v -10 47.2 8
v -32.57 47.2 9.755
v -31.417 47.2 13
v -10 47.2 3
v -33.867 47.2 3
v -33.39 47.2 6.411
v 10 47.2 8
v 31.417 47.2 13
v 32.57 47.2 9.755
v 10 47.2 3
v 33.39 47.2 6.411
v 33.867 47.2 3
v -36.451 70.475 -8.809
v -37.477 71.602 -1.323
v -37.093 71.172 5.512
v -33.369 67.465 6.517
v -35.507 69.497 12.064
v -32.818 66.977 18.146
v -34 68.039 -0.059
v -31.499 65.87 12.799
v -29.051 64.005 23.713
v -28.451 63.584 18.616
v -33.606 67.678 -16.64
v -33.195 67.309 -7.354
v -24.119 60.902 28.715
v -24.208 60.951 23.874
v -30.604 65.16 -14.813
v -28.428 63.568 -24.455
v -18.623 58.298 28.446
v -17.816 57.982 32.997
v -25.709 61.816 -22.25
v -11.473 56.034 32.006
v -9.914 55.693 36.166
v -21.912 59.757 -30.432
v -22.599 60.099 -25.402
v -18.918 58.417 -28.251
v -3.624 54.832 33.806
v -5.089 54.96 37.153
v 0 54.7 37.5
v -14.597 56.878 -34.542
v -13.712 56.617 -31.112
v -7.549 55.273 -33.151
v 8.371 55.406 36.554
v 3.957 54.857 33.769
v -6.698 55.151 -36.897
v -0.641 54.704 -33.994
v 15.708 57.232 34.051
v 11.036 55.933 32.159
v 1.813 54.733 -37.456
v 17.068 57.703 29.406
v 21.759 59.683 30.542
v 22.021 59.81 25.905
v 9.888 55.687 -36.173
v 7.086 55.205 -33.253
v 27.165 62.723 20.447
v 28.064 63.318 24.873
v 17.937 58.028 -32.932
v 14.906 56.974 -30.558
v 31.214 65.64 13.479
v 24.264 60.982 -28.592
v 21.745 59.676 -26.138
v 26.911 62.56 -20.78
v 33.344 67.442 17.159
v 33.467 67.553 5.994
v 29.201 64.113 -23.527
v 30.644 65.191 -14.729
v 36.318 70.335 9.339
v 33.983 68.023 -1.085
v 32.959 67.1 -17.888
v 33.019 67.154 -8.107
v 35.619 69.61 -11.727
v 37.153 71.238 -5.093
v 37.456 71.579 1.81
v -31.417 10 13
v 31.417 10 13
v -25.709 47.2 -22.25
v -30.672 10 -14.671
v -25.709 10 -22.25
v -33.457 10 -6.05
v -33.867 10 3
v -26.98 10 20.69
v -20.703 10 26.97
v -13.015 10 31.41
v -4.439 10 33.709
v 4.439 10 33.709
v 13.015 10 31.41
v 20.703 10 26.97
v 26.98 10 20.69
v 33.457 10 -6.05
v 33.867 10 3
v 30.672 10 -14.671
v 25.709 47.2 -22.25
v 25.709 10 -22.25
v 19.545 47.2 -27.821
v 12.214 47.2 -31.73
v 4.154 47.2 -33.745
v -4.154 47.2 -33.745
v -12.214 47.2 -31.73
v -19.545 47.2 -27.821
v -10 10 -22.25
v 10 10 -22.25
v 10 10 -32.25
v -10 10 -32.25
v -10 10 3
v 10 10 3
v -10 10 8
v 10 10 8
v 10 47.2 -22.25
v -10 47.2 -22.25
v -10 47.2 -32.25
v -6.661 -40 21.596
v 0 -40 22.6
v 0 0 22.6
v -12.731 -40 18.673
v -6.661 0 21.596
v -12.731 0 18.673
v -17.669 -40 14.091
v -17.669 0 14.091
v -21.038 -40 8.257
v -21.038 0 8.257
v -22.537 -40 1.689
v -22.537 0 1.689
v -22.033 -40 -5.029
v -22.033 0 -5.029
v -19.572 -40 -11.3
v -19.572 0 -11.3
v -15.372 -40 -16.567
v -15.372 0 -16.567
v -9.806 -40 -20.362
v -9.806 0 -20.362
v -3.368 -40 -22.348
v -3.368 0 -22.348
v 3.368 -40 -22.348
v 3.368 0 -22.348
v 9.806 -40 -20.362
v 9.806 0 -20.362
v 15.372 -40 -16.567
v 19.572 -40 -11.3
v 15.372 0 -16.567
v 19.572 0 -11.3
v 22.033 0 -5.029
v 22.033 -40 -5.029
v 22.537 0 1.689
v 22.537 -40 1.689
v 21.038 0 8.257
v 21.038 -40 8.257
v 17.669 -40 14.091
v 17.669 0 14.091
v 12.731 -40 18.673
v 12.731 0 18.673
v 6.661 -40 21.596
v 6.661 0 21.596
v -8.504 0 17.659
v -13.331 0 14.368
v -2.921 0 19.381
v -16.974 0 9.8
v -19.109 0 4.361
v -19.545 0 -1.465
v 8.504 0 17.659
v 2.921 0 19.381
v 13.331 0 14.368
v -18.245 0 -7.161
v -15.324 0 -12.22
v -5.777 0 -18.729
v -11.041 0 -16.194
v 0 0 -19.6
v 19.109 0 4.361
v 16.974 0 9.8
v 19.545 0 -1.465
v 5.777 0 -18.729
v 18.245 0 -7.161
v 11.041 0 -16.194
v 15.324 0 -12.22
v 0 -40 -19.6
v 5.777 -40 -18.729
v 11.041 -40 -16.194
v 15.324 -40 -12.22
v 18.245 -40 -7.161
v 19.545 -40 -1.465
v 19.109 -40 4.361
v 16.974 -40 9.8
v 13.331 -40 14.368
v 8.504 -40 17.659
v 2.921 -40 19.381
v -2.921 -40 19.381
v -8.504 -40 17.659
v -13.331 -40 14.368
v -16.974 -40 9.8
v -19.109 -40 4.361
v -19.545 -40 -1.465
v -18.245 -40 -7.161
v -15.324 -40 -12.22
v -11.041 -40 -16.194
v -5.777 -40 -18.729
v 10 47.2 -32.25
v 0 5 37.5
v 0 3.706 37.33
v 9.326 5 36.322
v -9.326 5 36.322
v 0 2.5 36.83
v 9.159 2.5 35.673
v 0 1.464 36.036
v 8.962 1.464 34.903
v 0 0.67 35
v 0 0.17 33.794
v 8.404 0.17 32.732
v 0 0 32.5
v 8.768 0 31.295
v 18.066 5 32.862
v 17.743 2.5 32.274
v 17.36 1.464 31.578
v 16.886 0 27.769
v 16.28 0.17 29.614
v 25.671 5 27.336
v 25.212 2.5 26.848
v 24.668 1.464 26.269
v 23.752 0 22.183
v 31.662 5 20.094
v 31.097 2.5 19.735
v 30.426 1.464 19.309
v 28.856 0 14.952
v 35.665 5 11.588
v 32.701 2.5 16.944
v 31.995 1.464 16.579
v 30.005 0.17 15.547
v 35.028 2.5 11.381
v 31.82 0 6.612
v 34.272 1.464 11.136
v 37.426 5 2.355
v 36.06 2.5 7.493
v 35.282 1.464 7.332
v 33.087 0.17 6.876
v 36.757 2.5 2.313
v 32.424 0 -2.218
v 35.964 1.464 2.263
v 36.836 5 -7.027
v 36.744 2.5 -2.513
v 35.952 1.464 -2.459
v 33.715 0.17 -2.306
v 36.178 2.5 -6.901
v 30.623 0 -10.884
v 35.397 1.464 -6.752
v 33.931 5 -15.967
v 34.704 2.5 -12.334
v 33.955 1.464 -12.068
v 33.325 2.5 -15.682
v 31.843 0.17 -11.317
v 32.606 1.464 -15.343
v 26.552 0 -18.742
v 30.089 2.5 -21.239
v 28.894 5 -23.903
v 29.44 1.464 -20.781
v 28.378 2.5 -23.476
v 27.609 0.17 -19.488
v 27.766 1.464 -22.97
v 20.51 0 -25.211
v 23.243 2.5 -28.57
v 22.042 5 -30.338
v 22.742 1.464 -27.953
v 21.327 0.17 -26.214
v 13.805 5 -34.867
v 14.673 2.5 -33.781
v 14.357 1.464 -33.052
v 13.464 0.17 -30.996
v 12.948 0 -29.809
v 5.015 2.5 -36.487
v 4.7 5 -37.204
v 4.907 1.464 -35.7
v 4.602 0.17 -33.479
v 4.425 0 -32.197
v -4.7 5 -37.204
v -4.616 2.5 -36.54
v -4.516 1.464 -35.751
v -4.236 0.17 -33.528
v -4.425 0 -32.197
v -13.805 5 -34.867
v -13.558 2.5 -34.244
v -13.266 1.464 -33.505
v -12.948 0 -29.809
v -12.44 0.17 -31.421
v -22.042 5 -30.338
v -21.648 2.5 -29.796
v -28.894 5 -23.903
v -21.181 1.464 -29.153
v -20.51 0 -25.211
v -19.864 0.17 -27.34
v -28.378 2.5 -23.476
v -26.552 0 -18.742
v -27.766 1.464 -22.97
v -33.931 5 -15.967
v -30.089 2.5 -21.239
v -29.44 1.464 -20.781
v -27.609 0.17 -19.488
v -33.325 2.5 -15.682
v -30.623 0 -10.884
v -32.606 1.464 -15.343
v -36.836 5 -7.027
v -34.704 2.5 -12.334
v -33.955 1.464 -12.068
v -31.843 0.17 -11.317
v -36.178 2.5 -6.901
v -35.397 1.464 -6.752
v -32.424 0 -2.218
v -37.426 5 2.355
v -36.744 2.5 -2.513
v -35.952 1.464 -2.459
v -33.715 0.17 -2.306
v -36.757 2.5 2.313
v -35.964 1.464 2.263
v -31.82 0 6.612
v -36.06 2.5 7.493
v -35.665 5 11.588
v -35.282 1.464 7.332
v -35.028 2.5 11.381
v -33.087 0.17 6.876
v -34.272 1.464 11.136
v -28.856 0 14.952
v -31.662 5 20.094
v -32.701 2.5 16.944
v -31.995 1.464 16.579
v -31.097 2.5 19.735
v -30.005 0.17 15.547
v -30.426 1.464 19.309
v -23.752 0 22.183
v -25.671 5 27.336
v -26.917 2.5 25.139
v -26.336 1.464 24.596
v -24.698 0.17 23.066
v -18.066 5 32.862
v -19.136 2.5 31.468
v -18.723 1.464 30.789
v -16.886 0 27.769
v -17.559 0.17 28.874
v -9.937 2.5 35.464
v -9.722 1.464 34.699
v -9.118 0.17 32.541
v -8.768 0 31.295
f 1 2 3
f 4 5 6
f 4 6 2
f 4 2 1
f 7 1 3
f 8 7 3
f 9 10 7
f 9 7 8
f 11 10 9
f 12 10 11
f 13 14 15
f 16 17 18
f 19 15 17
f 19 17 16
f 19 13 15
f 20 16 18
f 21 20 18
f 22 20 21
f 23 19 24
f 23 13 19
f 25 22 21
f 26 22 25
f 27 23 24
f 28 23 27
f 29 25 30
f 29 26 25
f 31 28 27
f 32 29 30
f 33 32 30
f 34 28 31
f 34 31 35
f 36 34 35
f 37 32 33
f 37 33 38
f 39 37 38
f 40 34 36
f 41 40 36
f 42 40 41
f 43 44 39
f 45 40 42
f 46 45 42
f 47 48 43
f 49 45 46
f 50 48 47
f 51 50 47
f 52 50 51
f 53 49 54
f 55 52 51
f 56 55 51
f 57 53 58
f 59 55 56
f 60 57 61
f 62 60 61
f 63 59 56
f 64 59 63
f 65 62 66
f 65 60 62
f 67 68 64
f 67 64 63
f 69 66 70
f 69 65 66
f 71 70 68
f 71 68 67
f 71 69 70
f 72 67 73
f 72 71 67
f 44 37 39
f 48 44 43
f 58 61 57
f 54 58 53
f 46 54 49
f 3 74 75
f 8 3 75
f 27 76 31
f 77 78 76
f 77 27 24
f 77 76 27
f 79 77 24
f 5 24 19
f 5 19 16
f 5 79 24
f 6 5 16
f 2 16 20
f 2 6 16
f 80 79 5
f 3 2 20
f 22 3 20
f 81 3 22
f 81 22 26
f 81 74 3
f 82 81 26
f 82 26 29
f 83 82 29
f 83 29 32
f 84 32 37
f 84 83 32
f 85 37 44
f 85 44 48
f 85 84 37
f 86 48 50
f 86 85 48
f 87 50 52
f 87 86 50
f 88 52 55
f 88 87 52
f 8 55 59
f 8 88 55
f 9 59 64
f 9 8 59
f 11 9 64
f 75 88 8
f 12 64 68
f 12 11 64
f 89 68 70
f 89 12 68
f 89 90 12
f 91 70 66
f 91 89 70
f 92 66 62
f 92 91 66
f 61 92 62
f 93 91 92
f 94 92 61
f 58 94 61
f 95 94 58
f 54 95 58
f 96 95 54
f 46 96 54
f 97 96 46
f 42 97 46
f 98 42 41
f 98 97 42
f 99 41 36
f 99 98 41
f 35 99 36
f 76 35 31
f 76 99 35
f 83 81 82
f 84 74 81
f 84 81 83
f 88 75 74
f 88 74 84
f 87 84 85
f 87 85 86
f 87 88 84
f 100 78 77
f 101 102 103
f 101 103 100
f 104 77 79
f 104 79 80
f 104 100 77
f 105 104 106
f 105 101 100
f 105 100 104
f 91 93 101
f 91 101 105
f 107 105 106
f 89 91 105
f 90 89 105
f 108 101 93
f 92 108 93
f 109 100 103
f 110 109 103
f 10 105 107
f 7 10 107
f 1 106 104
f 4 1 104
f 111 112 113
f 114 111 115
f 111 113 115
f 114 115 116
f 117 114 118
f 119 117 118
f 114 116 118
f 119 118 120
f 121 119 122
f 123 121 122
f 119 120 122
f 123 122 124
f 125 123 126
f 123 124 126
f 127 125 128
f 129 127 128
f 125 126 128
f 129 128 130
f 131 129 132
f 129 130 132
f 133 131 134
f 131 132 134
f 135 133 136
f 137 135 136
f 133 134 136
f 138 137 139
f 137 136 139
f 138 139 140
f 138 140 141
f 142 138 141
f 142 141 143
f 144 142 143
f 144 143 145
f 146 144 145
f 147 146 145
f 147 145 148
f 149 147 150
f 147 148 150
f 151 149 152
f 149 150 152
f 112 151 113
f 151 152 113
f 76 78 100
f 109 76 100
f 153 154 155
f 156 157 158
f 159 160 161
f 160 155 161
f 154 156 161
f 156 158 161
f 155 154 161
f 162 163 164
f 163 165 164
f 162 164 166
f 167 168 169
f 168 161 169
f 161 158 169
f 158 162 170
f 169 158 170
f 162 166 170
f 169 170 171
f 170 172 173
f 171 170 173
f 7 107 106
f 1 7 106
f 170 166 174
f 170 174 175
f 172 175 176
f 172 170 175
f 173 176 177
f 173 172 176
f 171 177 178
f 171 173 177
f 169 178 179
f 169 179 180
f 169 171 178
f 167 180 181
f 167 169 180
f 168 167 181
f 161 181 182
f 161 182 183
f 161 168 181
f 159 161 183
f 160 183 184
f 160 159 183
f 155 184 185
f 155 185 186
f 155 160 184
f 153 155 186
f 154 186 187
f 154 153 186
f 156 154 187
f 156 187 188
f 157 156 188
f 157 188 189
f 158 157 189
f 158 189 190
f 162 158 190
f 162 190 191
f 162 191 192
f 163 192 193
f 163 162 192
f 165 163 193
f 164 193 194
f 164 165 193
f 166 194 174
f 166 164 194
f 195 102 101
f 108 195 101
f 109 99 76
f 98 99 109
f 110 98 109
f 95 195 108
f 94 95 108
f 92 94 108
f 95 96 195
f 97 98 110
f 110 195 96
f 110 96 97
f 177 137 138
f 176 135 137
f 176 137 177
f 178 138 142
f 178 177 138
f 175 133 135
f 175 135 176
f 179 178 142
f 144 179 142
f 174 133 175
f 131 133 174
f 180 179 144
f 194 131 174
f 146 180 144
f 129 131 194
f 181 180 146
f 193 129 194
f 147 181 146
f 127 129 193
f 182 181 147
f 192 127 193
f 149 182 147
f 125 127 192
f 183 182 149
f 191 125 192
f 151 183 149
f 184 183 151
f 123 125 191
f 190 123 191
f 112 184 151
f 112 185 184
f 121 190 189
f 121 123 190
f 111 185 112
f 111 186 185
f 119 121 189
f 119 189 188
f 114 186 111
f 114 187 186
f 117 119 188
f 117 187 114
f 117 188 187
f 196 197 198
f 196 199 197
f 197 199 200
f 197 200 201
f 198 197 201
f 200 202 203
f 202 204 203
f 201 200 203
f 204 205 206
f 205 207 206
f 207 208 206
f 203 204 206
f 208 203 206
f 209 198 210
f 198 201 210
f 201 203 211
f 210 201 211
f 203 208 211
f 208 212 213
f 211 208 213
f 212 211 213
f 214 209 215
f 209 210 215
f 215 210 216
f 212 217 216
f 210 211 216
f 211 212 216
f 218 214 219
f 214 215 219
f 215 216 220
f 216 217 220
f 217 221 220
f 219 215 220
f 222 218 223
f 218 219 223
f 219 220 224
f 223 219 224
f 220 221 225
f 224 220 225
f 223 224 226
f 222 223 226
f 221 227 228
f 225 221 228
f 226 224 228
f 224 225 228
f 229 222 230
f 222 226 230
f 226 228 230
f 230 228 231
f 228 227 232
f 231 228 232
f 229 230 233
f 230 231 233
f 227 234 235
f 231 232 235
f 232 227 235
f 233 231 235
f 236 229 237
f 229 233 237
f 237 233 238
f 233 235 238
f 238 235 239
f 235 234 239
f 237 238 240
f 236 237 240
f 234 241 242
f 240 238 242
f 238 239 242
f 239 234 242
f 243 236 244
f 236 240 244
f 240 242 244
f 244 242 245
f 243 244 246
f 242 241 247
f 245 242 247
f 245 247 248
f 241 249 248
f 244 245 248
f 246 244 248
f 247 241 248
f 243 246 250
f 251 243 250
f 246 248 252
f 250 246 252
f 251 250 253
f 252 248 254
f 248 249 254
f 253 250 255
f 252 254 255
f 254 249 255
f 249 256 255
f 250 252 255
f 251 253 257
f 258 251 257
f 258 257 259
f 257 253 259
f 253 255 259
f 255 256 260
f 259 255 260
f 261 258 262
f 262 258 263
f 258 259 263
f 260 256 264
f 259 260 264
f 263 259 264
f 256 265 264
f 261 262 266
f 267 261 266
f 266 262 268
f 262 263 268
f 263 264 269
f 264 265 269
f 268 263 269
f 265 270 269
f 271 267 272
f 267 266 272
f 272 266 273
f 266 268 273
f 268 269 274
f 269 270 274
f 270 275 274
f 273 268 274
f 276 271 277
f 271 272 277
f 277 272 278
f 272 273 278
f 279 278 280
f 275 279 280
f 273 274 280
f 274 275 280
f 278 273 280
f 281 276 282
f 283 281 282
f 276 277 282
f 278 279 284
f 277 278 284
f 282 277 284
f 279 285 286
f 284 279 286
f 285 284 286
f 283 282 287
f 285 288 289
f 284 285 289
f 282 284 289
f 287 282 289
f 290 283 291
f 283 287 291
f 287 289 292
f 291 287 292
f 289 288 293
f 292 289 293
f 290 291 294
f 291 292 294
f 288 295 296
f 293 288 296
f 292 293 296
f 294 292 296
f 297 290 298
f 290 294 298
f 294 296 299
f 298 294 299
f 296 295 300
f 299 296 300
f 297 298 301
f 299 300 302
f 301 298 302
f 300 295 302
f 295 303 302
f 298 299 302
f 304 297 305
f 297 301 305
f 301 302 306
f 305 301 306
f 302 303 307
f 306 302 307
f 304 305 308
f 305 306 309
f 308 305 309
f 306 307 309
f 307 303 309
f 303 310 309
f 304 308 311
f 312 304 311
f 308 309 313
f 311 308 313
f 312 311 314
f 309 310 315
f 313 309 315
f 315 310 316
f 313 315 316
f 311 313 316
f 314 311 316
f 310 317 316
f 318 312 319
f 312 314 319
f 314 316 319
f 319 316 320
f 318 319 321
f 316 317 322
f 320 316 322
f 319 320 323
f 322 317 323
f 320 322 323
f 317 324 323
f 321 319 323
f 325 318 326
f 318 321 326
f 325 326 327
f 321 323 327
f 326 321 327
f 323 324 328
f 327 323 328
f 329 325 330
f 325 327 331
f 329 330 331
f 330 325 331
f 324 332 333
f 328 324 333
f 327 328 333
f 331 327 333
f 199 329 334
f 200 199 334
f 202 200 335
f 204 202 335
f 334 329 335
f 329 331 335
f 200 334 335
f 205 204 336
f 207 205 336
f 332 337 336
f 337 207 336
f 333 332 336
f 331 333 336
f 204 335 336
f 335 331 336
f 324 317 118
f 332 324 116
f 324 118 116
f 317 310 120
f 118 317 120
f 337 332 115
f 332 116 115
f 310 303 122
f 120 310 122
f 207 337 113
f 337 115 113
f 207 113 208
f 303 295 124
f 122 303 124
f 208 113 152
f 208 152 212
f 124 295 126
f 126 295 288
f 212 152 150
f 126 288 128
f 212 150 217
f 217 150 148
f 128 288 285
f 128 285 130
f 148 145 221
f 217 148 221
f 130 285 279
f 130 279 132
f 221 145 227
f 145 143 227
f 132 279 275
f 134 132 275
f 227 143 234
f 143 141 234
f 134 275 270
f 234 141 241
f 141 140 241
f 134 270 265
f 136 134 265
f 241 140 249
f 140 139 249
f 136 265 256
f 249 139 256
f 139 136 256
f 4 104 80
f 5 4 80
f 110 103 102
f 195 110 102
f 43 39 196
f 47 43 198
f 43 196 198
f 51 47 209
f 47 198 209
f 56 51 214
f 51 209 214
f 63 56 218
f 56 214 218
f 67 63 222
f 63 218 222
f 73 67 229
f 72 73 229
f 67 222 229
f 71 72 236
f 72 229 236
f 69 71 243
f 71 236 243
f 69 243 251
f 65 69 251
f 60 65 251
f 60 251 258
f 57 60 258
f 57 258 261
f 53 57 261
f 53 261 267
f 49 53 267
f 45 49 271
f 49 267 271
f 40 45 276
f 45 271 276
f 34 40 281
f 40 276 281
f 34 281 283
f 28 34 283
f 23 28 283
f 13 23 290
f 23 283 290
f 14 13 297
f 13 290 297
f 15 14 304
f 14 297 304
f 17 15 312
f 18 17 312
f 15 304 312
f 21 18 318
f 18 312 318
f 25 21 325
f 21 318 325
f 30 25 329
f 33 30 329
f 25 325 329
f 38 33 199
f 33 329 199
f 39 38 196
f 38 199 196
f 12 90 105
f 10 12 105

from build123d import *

# Parameters (mm, degrees)
SKETCH1_R               = 37.5
SKETCH1_R_2             = 34
BOSS_EXTRUDE1_DEPTH     = 10
BOSS_EXTRUDE2_DEPTH     = 37.2
SKETCH2_3_R             = 37.5
SKETCH2_3_R_2           = 34
BOSS_EXTRUDE3_DEPTH     = 94.7
CUT_EXTRUDE2_DEPTH      = 60
CUT_EXTRUDE2_DEPTH_BACK = 60
SKETCH3_R               = 50
SKETCH4_R               = 22.6
SKETCH4_R_2             = 19.6
BOSS_EXTRUDE4_DEPTH     = 40
FILLET1_R               = 5


with BuildPart() as part:
    # Sketch1 → Boss-Extrude1 (new body)
    # profile 1 of 2: a face of its own
    with BuildSketch(Plane(origin=(0, 0, 0), x_dir=(1, 0, 0), z_dir=(0, 1, 0))):
        with Locations(Location((0, 0, 0), (0, 0, 270))):
            Circle(SKETCH1_R)
        Circle(SKETCH1_R_2, mode=Mode.SUBTRACT)
    # profile 2 of 2: a face of its own
    with BuildSketch(Plane(origin=(0, 0, 0), x_dir=(1, 0, 0), z_dir=(0, 1, 0))):
        Circle(SKETCH1_R_2)
    extrude(amount=BOSS_EXTRUDE1_DEPTH)

    # Sketch2 → Boss-Extrude2 (add)
    with BuildSketch(Plane(origin=(0, 10, 0), x_dir=(1, 0, 0), z_dir=(0, 1, 0))):
        with BuildLine():
            ThreePointArc((25.708704752, 22.25), (0, 34), (-25.708704752, 22.25))
            Line((-25.708704752, 22.25), (-10, 22.25))
            Line((-10, 22.25), (-10, 32.25))
            Line((-10, 32.25), (10, 32.25))
            Line((10, 32.25), (10, 22.25))
            Line((10, 22.25), (25.708704752, 22.25))
        make_face()
        with BuildLine():
            Line((-10, -3), (-33.867388444, -3))
            ThreePointArc((-33.867388444, -3), (-33.022694549, -8.09330864), (-31.416556145, -13))
            Line((-31.416556145, -13), (31.416556145, -13))
            ThreePointArc((31.416556145, -13), (33.022694549, -8.09330864), (33.867388444, -3))
            Line((33.867388444, -3), (10, -3))
            Line((10, -3), (10, -8))
            Line((10, -8), (-10, -8))
            Line((-10, -8), (-10, -3))
        make_face()
    extrude(amount=BOSS_EXTRUDE2_DEPTH)

    # Sketch2_3 → Boss-Extrude3 (add)
    with BuildSketch(Plane(origin=(0, 10, 0), x_dir=(1, 0, 0), z_dir=(0, 1, 0))):
        with Locations(Location((0, 0, 0), (0, 0, 270))):
            Circle(SKETCH2_3_R)
        with Locations(Location((0, 0, 0), (0, 0, 139.124938123))):
            Circle(SKETCH2_3_R_2, mode=Mode.SUBTRACT)
    extrude(amount=BOSS_EXTRUDE3_DEPTH)

    # Sketch3 → Cut-Extrude2 (cut, two sides: drawn at the far end of the back side and taken through both)
    with BuildSketch(Plane.XY.offset(-CUT_EXTRUDE2_DEPTH_BACK)):
        with Locations((0, 104.7)):
            Circle(SKETCH3_R)
    extrude(amount=CUT_EXTRUDE2_DEPTH + CUT_EXTRUDE2_DEPTH_BACK, mode=Mode.SUBTRACT)

    # Sketch4 → Boss-Extrude4 (add)
    with BuildSketch(Plane.XZ):
        with Locations(Location((0, 0, 0), (0, 0, 90))):
            Circle(SKETCH4_R)
        with Locations(Location((0, 0, 0), (0, 0, 270))):
            Circle(SKETCH4_R_2, mode=Mode.SUBTRACT)
    extrude(amount=BOSS_EXTRUDE4_DEPTH)

    # Fillet1
    fillet1_edges = [part.edges().sort_by_distance(p)[0] for p in [
        (0, 0, -37.5),
    ]]
    fillet(fillet1_edges, radius=FILLET1_R)


solid = part.part
